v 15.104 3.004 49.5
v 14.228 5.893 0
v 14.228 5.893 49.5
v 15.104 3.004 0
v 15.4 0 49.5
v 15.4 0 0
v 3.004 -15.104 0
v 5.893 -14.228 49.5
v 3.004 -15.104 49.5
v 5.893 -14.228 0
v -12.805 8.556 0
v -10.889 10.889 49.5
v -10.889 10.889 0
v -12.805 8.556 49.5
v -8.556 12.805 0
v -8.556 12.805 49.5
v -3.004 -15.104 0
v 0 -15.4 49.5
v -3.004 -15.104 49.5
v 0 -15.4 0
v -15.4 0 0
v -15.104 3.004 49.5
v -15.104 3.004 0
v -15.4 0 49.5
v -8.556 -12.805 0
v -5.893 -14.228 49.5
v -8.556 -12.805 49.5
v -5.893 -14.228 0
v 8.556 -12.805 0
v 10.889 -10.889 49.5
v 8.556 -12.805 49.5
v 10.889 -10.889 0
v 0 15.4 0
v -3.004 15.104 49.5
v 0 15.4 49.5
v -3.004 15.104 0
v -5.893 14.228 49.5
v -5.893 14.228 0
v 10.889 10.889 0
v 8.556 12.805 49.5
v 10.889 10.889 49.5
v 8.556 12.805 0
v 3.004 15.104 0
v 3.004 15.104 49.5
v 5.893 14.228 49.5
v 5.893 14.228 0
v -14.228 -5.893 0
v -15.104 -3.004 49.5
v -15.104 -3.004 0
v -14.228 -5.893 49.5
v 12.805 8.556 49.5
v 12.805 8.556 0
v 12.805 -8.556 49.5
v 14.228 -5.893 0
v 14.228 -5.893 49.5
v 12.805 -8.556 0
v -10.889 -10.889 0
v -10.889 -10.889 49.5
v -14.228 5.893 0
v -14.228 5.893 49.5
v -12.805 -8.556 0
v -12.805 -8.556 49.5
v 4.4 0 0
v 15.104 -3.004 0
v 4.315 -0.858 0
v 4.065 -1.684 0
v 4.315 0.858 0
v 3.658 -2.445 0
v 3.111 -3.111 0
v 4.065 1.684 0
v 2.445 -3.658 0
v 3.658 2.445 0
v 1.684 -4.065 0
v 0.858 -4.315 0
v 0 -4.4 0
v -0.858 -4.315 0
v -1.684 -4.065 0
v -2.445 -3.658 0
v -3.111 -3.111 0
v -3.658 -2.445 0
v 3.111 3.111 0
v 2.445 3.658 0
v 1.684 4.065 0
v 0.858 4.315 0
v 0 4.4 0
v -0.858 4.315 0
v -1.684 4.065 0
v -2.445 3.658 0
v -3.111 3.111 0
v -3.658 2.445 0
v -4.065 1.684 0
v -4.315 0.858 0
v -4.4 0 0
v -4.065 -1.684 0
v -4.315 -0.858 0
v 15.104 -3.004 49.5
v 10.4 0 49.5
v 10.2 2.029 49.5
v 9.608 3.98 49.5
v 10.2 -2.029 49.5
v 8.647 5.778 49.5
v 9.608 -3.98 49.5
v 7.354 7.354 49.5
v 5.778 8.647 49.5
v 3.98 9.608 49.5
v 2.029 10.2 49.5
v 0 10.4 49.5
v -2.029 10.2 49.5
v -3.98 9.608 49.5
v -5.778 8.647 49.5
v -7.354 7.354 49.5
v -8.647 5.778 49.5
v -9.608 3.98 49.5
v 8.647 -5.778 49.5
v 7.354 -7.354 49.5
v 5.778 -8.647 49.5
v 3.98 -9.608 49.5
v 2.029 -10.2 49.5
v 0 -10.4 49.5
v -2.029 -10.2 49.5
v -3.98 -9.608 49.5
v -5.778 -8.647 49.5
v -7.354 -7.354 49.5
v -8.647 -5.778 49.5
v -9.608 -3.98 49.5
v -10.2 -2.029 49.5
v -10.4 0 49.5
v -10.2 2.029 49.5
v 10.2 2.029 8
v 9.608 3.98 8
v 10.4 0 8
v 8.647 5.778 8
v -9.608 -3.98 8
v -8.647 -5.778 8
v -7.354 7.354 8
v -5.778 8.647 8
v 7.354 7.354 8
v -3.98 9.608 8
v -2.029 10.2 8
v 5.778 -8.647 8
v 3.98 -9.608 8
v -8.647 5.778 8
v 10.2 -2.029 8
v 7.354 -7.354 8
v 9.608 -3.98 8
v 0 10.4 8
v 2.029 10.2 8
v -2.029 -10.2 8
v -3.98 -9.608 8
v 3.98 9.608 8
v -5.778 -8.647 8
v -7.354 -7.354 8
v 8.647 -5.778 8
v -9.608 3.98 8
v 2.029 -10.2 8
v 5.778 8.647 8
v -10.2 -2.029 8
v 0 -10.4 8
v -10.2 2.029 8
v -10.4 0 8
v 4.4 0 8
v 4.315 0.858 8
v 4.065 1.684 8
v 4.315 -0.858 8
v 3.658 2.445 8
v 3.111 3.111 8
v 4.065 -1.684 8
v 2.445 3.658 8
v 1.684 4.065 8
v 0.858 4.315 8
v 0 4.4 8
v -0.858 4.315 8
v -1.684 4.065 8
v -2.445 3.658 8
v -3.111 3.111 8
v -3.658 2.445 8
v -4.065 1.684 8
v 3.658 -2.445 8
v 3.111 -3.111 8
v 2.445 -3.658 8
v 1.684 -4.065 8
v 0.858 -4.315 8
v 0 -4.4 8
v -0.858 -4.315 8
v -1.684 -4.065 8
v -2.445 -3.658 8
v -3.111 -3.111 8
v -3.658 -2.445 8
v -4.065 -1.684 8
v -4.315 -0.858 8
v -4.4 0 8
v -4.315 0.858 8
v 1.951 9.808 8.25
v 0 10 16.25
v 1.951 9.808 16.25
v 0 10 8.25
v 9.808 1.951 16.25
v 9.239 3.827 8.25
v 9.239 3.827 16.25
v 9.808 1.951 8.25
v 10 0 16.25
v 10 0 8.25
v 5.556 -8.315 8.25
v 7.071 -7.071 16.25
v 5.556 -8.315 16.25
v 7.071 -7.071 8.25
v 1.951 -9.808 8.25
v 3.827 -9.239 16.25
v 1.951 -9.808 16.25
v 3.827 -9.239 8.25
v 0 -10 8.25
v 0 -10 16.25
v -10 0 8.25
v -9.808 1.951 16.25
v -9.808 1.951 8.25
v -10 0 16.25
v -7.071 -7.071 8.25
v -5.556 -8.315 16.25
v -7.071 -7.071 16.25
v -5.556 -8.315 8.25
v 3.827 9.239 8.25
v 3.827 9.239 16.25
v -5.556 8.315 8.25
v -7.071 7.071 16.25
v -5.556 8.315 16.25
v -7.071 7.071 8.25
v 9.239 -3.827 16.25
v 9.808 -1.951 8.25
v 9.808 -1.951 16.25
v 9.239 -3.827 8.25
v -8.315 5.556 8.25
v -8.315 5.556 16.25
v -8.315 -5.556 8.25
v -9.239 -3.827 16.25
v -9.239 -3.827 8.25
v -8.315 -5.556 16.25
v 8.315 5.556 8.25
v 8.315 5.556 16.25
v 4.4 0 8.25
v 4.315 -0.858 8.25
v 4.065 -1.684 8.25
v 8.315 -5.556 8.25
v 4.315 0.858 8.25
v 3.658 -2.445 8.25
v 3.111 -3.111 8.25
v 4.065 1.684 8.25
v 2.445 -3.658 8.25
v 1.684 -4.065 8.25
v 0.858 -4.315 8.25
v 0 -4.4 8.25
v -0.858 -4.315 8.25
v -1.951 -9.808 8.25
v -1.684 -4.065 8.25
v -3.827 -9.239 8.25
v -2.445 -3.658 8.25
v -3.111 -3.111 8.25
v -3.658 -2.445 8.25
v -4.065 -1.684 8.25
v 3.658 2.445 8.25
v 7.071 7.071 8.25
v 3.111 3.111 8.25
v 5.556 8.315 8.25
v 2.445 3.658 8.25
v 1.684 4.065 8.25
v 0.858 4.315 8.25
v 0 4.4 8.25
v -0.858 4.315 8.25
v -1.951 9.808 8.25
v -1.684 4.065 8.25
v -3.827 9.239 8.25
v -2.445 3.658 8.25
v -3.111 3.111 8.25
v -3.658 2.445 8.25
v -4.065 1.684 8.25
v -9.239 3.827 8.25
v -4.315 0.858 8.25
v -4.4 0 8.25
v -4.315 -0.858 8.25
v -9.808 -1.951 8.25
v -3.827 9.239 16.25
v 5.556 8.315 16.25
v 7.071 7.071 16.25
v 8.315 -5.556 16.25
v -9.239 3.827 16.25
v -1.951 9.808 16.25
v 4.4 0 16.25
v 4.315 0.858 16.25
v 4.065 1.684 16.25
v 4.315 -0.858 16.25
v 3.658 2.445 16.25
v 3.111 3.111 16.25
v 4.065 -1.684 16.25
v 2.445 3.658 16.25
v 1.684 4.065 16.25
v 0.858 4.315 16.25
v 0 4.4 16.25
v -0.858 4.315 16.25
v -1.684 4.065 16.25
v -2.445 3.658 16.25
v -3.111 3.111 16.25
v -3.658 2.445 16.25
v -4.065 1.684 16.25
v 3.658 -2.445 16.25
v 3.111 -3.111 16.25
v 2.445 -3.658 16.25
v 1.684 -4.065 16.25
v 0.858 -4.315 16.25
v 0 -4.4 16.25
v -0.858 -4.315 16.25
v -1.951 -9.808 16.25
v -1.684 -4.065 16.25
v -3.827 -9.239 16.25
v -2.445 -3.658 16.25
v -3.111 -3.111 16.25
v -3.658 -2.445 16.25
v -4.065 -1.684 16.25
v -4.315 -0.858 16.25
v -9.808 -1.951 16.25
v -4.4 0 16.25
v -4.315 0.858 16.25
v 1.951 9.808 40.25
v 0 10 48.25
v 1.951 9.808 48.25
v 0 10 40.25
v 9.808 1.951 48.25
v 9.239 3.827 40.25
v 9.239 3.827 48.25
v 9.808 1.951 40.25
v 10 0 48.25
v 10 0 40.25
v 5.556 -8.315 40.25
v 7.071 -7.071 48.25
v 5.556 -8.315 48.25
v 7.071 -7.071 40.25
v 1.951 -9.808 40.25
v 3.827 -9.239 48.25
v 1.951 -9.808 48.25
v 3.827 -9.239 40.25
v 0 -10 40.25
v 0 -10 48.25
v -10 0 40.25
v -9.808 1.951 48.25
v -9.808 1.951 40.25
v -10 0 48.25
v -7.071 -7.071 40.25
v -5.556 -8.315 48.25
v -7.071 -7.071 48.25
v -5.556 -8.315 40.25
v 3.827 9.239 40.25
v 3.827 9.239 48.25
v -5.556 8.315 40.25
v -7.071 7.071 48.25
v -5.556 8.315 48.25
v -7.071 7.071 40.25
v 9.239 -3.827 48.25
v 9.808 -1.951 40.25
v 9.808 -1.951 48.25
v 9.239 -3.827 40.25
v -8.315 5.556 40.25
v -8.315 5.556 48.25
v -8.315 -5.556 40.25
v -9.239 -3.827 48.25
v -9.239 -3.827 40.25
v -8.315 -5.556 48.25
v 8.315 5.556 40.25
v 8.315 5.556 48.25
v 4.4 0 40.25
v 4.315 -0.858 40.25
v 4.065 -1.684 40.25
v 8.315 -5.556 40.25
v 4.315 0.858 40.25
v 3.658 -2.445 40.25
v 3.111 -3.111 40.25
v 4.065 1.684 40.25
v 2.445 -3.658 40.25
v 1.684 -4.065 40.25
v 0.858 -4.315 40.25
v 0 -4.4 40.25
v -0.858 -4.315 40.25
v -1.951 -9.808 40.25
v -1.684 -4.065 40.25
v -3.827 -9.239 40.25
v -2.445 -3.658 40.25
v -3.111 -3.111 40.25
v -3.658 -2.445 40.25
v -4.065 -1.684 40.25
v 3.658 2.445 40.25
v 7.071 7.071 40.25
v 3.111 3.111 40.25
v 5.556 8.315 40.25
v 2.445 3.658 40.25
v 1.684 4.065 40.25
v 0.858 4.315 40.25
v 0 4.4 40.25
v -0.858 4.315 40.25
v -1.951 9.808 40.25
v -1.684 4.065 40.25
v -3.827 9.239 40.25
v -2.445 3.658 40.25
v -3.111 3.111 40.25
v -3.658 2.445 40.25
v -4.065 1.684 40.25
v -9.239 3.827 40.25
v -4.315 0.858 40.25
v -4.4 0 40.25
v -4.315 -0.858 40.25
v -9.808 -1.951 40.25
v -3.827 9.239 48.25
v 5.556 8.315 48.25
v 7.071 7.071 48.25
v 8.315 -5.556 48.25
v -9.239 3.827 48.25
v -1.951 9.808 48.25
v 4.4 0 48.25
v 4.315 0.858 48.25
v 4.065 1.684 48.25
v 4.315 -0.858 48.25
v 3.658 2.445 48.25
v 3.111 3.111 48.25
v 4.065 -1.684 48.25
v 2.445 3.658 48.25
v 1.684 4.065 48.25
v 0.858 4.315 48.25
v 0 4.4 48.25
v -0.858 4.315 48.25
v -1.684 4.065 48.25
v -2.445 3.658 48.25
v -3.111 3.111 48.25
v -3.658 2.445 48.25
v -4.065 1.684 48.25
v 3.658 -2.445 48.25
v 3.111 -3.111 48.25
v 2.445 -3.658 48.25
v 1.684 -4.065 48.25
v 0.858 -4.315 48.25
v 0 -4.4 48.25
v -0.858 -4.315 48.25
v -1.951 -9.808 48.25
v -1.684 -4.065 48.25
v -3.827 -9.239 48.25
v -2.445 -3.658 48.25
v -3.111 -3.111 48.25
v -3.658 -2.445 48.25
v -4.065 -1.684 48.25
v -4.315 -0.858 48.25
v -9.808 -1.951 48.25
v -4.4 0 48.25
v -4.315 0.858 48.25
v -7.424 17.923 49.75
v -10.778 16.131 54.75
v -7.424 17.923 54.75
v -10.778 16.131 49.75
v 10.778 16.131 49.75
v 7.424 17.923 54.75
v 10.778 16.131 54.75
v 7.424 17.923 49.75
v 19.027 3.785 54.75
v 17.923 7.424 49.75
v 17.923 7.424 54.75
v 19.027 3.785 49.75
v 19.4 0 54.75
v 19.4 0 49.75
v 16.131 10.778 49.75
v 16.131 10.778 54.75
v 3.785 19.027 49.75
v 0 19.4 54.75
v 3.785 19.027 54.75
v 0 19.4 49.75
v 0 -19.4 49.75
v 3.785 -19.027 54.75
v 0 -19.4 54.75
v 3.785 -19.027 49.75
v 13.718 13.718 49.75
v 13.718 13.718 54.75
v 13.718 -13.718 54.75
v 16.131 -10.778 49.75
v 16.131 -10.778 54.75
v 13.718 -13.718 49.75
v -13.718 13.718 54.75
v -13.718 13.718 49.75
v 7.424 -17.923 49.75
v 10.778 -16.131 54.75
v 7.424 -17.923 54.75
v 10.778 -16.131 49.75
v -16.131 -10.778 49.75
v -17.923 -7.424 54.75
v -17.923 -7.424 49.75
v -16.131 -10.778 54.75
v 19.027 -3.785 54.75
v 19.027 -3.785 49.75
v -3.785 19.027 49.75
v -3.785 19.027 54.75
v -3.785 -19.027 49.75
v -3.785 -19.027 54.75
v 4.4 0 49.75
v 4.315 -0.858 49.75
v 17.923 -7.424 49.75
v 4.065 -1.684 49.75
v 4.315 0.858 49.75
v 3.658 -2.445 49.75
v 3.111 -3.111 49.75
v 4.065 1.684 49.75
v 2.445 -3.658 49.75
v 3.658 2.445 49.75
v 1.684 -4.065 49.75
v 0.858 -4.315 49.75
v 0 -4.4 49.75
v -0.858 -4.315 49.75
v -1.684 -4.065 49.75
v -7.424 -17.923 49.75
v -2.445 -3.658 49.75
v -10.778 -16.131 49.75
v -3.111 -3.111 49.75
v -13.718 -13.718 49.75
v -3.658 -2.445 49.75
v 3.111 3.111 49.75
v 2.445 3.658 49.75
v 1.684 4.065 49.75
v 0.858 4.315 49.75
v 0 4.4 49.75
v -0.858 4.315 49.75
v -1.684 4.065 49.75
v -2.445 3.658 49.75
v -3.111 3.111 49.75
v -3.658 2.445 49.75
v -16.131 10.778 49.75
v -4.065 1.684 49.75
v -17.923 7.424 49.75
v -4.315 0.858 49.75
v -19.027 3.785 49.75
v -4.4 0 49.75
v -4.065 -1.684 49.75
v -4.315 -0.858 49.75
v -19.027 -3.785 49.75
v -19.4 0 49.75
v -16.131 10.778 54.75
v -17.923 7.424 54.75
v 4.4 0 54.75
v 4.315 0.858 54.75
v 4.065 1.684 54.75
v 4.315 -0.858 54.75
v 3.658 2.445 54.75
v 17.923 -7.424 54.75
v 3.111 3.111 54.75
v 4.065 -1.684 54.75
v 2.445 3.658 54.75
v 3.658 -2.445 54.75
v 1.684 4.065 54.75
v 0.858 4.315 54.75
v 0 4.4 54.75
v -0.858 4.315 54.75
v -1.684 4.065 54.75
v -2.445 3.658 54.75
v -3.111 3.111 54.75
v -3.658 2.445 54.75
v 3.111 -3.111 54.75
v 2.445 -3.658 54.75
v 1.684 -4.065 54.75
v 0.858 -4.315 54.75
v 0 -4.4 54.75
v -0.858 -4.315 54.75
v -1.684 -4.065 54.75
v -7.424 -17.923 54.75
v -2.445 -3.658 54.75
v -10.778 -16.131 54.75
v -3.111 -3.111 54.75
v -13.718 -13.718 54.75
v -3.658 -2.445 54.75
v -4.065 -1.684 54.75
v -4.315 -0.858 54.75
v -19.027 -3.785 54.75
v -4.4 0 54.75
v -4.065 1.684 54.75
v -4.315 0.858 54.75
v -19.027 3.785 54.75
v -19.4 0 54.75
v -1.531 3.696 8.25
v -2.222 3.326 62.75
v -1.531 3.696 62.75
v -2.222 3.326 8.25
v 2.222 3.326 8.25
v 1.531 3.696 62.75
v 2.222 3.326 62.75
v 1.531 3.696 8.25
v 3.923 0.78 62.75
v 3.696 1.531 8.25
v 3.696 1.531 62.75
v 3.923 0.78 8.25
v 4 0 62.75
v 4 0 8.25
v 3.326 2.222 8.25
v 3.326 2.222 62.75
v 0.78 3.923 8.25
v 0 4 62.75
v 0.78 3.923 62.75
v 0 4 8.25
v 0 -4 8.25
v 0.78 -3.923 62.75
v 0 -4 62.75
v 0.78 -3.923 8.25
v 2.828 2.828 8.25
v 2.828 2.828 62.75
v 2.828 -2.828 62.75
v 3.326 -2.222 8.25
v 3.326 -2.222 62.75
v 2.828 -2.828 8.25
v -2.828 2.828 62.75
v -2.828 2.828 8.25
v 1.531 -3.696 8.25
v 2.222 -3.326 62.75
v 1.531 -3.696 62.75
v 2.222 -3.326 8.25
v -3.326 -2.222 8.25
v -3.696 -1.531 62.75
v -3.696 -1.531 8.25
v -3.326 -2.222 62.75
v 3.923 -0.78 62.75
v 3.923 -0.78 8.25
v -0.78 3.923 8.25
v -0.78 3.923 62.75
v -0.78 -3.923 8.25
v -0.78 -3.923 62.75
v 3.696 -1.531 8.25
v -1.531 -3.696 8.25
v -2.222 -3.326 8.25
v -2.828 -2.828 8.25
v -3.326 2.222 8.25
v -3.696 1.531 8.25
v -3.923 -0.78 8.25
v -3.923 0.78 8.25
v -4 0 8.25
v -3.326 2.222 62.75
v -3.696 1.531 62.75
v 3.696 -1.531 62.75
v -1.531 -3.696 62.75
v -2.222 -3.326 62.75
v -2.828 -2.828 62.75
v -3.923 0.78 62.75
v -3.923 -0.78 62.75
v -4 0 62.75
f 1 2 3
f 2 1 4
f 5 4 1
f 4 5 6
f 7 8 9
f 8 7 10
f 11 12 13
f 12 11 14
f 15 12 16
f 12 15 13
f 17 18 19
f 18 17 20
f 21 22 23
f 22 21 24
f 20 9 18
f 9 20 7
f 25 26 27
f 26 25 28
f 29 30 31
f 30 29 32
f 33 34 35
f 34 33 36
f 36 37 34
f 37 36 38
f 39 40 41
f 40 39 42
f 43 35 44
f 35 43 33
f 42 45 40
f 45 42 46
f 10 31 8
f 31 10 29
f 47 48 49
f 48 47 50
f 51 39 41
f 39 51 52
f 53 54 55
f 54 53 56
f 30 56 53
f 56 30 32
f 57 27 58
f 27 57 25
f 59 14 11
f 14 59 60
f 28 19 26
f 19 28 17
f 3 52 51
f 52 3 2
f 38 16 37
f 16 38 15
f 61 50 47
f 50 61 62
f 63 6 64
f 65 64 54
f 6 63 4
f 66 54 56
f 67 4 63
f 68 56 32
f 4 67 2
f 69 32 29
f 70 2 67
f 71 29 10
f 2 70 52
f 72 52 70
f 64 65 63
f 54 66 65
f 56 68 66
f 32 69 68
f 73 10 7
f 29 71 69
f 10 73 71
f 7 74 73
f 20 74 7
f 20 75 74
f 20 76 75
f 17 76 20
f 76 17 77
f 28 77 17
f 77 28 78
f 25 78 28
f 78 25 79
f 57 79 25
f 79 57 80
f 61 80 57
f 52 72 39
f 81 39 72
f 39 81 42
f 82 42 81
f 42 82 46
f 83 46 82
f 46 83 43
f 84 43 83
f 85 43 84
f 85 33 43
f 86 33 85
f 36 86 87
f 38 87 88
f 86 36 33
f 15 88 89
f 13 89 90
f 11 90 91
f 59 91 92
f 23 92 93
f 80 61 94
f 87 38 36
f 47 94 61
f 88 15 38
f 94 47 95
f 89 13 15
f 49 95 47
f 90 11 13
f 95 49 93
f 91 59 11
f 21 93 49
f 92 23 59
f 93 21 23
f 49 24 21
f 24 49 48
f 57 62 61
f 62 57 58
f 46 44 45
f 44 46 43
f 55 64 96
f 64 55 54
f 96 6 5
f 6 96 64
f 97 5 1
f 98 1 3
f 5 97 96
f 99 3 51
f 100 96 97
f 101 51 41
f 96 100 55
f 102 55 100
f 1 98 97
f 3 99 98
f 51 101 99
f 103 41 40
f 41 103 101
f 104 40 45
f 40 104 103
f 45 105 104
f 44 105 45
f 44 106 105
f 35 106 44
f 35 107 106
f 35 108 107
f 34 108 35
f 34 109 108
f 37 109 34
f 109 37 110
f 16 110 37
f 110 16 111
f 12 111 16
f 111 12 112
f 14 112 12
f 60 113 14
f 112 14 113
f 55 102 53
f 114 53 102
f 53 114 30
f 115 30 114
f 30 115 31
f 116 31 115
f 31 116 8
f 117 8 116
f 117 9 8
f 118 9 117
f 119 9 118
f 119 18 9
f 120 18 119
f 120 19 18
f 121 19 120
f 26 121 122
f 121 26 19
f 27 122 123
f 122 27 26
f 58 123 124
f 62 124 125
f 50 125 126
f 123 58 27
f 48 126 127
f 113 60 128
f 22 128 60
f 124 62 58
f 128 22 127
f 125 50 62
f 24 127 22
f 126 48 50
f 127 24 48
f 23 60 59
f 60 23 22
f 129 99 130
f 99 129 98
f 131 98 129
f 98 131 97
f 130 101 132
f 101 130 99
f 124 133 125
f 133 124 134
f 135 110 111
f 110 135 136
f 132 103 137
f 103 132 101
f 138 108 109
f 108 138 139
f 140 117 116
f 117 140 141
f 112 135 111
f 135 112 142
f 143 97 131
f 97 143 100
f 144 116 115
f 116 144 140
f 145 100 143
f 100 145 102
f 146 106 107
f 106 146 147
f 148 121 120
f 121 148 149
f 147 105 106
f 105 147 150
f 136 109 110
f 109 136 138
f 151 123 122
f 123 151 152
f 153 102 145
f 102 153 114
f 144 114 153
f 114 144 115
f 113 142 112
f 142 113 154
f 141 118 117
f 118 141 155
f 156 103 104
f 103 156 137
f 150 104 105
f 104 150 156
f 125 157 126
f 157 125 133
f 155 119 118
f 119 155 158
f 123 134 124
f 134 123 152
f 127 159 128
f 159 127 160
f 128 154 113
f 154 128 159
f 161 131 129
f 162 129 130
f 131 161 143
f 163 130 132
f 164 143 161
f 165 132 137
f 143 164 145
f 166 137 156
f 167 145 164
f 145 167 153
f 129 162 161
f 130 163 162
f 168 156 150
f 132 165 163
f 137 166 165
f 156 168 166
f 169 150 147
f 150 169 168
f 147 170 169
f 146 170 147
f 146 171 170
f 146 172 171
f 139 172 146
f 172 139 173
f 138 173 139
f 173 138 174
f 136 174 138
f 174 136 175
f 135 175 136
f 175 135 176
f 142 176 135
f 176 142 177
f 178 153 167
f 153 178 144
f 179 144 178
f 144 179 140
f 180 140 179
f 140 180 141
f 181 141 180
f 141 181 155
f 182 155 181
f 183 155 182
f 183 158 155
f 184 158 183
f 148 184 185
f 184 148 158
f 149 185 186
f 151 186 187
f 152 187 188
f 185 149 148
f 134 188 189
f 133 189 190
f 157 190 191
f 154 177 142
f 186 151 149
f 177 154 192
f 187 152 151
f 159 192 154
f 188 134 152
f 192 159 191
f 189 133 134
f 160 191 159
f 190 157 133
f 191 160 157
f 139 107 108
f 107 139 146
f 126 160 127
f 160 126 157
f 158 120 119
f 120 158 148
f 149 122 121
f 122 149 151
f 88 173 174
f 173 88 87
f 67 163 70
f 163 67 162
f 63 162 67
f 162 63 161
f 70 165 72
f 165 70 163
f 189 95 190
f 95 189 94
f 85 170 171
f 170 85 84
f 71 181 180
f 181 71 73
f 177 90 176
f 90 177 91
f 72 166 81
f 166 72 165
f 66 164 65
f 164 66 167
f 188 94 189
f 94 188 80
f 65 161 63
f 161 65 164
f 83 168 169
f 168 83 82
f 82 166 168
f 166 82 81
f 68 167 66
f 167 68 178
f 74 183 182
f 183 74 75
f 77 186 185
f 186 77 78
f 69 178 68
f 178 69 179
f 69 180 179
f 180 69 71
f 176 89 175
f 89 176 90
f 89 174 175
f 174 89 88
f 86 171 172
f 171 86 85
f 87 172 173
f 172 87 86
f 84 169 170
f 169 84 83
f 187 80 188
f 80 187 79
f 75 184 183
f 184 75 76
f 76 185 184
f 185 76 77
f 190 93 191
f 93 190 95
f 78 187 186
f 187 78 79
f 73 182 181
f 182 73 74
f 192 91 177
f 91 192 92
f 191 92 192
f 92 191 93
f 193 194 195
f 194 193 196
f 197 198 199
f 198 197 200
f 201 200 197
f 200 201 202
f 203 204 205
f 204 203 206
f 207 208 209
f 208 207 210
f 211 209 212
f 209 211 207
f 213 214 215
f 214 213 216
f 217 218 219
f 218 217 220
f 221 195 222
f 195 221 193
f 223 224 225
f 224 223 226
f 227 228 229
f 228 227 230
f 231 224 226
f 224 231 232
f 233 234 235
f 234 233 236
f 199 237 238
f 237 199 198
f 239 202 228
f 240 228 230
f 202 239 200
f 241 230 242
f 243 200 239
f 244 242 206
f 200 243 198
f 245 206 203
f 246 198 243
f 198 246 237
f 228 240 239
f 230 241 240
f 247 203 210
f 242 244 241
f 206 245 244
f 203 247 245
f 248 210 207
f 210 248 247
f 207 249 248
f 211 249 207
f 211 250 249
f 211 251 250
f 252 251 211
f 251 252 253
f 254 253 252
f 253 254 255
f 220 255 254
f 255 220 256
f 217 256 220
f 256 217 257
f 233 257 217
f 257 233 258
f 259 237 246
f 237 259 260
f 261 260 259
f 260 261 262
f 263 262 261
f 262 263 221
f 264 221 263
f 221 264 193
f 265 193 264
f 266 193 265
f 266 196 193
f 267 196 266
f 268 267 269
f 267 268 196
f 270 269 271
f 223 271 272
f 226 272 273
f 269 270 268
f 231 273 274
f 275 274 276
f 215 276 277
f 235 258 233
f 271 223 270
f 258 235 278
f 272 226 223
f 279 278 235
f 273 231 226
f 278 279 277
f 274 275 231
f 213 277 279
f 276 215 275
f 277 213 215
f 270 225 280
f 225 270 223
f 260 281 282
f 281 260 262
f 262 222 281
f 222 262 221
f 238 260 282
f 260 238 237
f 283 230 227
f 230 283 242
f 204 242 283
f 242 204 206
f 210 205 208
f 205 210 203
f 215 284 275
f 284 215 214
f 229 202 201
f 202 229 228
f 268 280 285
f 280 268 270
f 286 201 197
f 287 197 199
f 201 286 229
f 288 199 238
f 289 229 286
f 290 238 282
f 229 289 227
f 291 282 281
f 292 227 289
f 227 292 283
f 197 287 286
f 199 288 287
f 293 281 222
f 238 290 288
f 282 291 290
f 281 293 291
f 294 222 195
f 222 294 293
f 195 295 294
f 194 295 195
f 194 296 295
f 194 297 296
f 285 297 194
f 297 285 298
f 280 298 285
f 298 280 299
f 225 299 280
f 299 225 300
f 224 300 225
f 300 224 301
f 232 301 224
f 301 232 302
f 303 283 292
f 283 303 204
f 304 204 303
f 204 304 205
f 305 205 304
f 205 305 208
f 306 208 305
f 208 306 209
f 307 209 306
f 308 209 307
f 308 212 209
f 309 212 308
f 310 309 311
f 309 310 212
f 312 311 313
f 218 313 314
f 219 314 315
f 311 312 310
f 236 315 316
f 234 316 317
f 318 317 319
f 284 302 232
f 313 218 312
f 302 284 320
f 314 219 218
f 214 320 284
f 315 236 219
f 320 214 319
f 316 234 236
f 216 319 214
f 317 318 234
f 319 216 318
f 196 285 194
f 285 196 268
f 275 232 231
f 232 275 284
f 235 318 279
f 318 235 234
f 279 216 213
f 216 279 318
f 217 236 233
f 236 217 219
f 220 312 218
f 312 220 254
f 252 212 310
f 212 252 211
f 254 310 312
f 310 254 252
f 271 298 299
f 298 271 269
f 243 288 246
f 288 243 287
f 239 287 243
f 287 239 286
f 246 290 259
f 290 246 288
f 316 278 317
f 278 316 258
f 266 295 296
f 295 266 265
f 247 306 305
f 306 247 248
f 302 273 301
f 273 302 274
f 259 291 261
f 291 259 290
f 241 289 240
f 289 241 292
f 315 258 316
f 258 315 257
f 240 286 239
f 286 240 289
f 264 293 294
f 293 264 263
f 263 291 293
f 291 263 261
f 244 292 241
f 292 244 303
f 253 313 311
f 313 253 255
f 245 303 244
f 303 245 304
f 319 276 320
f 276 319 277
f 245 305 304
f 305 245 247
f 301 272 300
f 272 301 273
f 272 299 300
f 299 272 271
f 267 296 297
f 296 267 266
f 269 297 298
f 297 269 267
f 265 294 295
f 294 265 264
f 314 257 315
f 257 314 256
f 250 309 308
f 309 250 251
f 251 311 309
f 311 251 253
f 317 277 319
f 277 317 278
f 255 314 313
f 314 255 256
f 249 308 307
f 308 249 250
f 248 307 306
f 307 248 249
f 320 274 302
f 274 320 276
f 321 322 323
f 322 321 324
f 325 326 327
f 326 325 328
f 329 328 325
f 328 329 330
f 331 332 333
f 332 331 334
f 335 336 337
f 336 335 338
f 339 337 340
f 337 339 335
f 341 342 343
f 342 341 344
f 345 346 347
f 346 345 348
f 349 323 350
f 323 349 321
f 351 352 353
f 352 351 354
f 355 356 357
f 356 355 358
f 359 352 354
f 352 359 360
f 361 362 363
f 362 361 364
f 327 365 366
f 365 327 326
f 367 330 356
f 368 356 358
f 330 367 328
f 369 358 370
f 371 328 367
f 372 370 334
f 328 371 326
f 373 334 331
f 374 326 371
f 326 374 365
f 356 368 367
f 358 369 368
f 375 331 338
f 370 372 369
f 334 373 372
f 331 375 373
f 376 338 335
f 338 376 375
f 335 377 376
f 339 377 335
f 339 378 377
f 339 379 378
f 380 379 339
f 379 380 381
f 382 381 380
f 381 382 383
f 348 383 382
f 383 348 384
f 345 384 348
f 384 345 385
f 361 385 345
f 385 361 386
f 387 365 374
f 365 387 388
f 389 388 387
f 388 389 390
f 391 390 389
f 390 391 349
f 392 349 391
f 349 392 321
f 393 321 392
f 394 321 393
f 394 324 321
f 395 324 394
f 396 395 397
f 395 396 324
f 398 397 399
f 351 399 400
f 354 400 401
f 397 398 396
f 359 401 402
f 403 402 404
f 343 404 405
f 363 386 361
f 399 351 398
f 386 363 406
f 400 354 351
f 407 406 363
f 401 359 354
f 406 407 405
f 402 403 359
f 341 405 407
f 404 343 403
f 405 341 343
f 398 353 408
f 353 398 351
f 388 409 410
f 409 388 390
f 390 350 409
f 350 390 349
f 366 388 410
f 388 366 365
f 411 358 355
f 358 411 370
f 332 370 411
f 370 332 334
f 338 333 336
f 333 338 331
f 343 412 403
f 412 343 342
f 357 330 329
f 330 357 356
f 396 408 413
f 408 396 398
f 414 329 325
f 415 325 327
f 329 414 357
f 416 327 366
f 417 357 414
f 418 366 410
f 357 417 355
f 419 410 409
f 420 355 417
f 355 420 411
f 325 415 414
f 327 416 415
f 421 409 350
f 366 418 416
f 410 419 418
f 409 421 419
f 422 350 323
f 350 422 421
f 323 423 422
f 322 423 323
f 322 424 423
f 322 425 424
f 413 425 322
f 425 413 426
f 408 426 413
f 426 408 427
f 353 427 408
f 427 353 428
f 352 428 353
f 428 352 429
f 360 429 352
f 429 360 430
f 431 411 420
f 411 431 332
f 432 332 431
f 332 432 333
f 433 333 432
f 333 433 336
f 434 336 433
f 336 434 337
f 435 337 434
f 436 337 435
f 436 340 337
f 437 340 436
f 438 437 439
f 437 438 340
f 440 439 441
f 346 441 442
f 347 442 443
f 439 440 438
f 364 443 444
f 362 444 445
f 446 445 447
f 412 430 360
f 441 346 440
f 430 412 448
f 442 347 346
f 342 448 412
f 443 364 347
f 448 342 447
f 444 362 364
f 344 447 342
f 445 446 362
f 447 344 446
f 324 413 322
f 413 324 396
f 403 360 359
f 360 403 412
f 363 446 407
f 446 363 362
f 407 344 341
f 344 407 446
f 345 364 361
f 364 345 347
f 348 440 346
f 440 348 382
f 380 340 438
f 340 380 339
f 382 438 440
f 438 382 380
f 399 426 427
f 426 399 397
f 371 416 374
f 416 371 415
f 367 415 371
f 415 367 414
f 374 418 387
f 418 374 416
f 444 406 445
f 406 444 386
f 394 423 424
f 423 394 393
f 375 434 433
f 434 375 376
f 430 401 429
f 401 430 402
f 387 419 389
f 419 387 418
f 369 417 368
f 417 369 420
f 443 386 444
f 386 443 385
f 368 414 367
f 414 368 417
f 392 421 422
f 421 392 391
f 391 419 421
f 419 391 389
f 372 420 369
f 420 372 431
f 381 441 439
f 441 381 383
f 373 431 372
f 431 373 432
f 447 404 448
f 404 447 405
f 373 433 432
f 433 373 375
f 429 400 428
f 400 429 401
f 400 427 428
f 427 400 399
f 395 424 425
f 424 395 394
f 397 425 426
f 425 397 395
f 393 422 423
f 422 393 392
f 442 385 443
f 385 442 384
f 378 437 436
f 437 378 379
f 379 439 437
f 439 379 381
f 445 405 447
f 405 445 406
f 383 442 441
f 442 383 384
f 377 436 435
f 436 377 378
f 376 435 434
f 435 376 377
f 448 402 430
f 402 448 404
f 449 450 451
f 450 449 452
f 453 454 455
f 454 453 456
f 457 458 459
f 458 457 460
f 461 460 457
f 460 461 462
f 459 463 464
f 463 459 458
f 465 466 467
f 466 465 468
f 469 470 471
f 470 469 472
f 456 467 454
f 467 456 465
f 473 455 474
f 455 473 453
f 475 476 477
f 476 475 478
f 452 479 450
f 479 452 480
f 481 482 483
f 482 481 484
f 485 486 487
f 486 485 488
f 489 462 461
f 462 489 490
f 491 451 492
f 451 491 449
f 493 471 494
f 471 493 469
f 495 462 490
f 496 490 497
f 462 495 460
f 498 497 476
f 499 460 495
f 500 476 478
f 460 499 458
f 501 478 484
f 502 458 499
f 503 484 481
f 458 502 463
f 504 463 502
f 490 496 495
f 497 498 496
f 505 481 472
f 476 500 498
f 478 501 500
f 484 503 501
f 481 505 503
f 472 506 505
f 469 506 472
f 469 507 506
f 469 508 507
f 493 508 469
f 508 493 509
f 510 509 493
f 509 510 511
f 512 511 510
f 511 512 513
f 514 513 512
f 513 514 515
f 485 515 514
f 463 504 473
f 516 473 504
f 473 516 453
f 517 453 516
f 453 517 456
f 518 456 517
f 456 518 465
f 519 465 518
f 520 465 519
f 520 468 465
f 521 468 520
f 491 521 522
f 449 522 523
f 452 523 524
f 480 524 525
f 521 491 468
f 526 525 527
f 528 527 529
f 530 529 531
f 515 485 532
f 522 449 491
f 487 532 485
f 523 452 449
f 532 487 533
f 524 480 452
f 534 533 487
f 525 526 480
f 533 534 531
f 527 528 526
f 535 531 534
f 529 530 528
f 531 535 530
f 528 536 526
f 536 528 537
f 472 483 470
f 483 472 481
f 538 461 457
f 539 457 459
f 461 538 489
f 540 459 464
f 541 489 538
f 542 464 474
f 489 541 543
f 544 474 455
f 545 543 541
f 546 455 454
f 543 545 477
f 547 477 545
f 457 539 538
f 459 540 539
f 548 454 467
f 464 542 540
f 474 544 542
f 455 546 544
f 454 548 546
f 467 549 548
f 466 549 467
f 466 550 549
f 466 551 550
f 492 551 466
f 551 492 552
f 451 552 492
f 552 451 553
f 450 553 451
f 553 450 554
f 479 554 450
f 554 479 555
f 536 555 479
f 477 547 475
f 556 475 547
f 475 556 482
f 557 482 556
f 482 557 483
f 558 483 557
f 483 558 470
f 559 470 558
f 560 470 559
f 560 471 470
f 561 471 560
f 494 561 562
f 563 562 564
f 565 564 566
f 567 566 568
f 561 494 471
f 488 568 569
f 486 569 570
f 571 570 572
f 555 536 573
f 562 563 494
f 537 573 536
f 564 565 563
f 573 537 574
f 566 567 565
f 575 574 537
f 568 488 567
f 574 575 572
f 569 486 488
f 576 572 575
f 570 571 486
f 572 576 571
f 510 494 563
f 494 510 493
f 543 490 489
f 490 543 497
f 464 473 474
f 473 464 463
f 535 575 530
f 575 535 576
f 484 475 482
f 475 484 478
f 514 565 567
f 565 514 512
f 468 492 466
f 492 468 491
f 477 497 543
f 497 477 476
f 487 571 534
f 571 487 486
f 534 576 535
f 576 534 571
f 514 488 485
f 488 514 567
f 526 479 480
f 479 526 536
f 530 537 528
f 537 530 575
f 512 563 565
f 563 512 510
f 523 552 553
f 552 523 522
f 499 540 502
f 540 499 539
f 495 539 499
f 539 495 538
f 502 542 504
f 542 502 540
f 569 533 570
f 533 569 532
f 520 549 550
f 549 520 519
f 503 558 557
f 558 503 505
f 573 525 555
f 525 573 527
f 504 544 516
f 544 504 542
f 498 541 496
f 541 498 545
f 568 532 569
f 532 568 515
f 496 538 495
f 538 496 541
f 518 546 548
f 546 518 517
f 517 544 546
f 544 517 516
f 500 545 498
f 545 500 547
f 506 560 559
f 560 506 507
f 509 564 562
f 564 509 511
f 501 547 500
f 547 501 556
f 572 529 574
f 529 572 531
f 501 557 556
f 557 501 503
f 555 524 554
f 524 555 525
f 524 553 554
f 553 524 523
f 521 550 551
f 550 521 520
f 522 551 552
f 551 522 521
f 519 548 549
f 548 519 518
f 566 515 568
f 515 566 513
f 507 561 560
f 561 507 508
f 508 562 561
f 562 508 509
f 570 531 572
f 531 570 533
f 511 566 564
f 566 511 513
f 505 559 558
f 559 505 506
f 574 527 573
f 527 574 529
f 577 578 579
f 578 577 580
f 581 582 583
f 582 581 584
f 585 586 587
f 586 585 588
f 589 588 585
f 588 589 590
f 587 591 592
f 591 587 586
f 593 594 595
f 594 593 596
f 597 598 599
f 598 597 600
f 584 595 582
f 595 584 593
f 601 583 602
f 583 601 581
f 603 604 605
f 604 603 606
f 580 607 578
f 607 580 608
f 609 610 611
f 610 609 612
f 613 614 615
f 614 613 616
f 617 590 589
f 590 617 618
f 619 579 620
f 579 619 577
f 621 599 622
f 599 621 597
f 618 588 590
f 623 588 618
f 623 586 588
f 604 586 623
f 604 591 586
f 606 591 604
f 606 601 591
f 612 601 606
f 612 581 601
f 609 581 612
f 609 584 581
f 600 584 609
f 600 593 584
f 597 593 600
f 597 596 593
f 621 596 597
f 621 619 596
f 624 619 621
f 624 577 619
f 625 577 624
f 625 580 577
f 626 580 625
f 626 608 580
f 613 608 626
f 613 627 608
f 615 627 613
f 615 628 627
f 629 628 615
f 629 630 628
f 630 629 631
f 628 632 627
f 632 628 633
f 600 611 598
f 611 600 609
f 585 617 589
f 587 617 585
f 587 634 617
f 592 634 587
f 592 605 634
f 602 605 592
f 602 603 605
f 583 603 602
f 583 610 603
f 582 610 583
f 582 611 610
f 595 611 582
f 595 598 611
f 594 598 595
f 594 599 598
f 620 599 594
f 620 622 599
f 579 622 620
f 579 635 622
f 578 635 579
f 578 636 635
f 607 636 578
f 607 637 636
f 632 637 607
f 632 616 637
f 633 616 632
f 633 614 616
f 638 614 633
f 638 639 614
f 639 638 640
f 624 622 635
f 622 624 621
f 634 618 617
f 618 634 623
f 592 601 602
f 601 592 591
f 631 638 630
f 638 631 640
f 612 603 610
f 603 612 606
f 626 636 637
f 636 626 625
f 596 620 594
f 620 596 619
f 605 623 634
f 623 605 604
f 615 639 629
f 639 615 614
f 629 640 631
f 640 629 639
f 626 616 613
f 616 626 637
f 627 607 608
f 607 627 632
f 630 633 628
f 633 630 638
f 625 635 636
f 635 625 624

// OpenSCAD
$fn = 32;

// ------------------------------------------------------------------------
// Shaft station: cup d30.8 x 49.5 mm, shaft d8
// Every part is its own module, assembly() places every instance.
// ------------------------------------------------------------------------

// --- part 1 ---
module housing_cup() {
  difference() {
    cylinder(h = 49.5, d = 30.8);
    translate([0, 0, 8]) cylinder(h = 42.5, d = 20.8);
    translate([0, 0, -1]) cylinder(h = 10, d = 8.8);
  }
}

// --- part 2 ---
module bearing_lower() {
  difference() {
      translate([0, 0, 0]) cylinder(h = 8, d = 20);
      translate([0, 0, -1]) cylinder(h = 10, d = 8.8);
    }
}

// --- part 3 ---
module bearing_upper() {
  difference() {
      translate([0, 0, 0]) cylinder(h = 8, d = 20);
      translate([0, 0, -1]) cylinder(h = 10, d = 8.8);
    }
}

// --- part 4 ---
module station_shaft() {
  translate([0, 0, -27.25]) cylinder(h = 54.5, d = 8);
}

// --- part 5 ---
module station_cover() {
  difference() {
    cylinder(h = 5, d = 38.8);
    translate([0, 0, -1]) cylinder(h = 7, d = 8.8);
  }
}

// --- assembly ---
module assembly() {
  color([0.80, 0.24, 0.20]) translate([0, 0, 0]) rotate([0, 0, 0]) housing_cup();
  color([0.20, 0.45, 0.75]) translate([0, 0, 8.25]) rotate([0, 0, 0]) bearing_lower();
  color([0.25, 0.62, 0.32]) translate([0, 0, 40.25]) rotate([0, 0, 0]) bearing_upper();
  color([0.92, 0.70, 0.18]) translate([0, 0, 35.5]) rotate([0, 0, 0]) station_shaft();
  color([0.58, 0.35, 0.70]) translate([0, 0, 49.75]) rotate([0, 0, 0]) station_cover();
}

assembly();
